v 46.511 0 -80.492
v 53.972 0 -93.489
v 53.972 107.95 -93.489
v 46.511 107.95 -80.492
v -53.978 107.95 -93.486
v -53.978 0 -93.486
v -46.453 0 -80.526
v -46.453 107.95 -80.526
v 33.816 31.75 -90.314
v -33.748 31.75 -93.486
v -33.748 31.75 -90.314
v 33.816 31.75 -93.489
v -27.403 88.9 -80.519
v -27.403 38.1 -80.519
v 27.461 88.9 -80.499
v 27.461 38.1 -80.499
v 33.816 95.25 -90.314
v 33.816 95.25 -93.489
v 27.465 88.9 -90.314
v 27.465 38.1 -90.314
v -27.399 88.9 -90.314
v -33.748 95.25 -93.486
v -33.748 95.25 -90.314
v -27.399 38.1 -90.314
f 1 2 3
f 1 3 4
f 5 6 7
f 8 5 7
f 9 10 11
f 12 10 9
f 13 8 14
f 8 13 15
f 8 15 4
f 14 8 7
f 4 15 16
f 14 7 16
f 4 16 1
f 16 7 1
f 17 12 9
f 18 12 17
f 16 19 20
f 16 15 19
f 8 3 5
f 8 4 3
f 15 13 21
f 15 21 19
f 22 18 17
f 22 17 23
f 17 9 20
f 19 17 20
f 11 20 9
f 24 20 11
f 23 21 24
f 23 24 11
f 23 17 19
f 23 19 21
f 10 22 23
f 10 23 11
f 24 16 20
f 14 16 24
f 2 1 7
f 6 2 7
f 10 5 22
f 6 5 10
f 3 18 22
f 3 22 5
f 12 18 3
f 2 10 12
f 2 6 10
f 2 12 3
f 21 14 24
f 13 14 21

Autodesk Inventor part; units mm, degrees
ref_plane "YZ Plane" through (0, 0, 0) normal (1, 0, 0) x (0, 1, 0)
ref_plane "XZ Plane" through (0, 0, 0) normal (0, 1, 0) x (-1, 0, 0)
ref_plane "XY Plane" through (0, 0, 0) normal (0, 0, 1) x (1, 0, 0)
sketch "Sketch1" plane through (0, 0, 0) normal (0, 1, 0) x (-1, 0, 0)
  line L0 (-107.95, -0.0035) -> (-53.978, 93.4857)
  line L1 (-53.978, 93.4857) -> (53.972, 93.4892)
  line L2 (53.972, 93.4892) -> (107.95, 0.0035)
  line L3 (107.95, 0.0035) -> (53.978, -93.4857)
  line L4 (53.978, -93.4857) -> (-53.972, -93.4892)
  line L5 (-53.972, -93.4892) -> (-107.95, -0.0035)
  line L6 (-92.964, 0.0336) -> (-46.4529, 80.526)
  line L7 (-46.4529, 80.526) -> (46.5111, 80.4924)
  line L8 (46.5111, 80.4924) -> (92.964, -0.0336)
  line L9 (92.964, -0.0336) -> (46.4529, -80.526)
  line L10 (46.4529, -80.526) -> (-46.5111, -80.4924)
  line L11 (-46.5111, -80.4924) -> (-92.964, 0.0336)
  line L12 (53.978, -93.4857) -> (46.4529, -80.526)
  line L13 (-53.972, -93.4892) -> (-46.5111, -80.4924)
  point P0 (0, 0)
  point P1 (0, 0)
  point P2 (0, 0)
  point P3 (0, 0)
  dimension "d0" = 215.9
  dimension "d1" = 14.986
extrude "Extrusion1" add sketch "Sketch1" along normal blind 107.95 contours L13 L10 L12 L4
sketch "Sketch2" plane through (46.5111, 0, -80.4924) normal (-0.0003616, 0, 0.9999999) x (0.9999999, 0, 0.0003616)
  line L0 (-92.9641, 0) -> (-92.9641, 107.95) projected
  line L1 (-92.9641, 107.95) -> (0, 107.95) projected
  line L2 (-92.9641, 0) -> (0, 0) projected
  line L3 (0, 0) -> (0, 107.95) projected
  line L4 (-73.9141, 88.9) -> (-19.05, 88.9)
  line L5 (-19.05, 88.9) -> (-19.05, 38.1)
  line L6 (-19.05, 38.1) -> (-73.9141, 38.1)
  line L7 (-73.9141, 38.1) -> (-73.9141, 88.9)
  point P0 (-46.482, 0)
  dimension "d4" = 19.05
  dimension "d5" = 19.05
  dimension "d6" = 38.1
  dimension "d7" = 19.05
extrude "Extrusion2" cut sketch "Sketch2" against normal up to surface (12.9965 mm away) contours L4 L5 L6 L7
sketch "Sketch3" plane through (53.972, 0, -93.4892) normal (-0.000032, 0, -1) x (-1, 0, 0.000032)
  line L0 (0, 107.95) -> (107.95, 107.95) projected
  line L1 (0, 0) -> (0, 107.95) projected
  line L2 (26.5062, 88.9) -> (81.3702, 88.9) projected
  line L3 (26.5062, 38.1) -> (26.5062, 88.9) projected
  line L4 (81.3702, 88.9) -> (81.3702, 38.1) projected
  line L5 (81.3702, 38.1) -> (26.5062, 38.1) projected
  line L6 (20.1562, 95.25) -> (87.7202, 95.25)
  line L7 (87.7202, 95.25) -> (87.7202, 31.75)
  line L8 (87.7202, 31.75) -> (20.1562, 31.75)
  line L9 (20.1562, 31.75) -> (20.1562, 95.25)
  point P0 (53.975, 0)
  dimension "d12" = 6.35
  dimension "d13" = 6.35
  dimension "d14" = 6.35
  dimension "d15" = 6.35
extrude "Extrusion3" cut sketch "Sketch3" against normal blind 3.175 contours L2 L4 L5 L3 | L6 L7 L8 L9
equation "\"d7\" = d4"
equation "\"d14\" = d13"
equation "\"d15\" = d12"
properties part number "SatelliteSideWallSensor_v2"
